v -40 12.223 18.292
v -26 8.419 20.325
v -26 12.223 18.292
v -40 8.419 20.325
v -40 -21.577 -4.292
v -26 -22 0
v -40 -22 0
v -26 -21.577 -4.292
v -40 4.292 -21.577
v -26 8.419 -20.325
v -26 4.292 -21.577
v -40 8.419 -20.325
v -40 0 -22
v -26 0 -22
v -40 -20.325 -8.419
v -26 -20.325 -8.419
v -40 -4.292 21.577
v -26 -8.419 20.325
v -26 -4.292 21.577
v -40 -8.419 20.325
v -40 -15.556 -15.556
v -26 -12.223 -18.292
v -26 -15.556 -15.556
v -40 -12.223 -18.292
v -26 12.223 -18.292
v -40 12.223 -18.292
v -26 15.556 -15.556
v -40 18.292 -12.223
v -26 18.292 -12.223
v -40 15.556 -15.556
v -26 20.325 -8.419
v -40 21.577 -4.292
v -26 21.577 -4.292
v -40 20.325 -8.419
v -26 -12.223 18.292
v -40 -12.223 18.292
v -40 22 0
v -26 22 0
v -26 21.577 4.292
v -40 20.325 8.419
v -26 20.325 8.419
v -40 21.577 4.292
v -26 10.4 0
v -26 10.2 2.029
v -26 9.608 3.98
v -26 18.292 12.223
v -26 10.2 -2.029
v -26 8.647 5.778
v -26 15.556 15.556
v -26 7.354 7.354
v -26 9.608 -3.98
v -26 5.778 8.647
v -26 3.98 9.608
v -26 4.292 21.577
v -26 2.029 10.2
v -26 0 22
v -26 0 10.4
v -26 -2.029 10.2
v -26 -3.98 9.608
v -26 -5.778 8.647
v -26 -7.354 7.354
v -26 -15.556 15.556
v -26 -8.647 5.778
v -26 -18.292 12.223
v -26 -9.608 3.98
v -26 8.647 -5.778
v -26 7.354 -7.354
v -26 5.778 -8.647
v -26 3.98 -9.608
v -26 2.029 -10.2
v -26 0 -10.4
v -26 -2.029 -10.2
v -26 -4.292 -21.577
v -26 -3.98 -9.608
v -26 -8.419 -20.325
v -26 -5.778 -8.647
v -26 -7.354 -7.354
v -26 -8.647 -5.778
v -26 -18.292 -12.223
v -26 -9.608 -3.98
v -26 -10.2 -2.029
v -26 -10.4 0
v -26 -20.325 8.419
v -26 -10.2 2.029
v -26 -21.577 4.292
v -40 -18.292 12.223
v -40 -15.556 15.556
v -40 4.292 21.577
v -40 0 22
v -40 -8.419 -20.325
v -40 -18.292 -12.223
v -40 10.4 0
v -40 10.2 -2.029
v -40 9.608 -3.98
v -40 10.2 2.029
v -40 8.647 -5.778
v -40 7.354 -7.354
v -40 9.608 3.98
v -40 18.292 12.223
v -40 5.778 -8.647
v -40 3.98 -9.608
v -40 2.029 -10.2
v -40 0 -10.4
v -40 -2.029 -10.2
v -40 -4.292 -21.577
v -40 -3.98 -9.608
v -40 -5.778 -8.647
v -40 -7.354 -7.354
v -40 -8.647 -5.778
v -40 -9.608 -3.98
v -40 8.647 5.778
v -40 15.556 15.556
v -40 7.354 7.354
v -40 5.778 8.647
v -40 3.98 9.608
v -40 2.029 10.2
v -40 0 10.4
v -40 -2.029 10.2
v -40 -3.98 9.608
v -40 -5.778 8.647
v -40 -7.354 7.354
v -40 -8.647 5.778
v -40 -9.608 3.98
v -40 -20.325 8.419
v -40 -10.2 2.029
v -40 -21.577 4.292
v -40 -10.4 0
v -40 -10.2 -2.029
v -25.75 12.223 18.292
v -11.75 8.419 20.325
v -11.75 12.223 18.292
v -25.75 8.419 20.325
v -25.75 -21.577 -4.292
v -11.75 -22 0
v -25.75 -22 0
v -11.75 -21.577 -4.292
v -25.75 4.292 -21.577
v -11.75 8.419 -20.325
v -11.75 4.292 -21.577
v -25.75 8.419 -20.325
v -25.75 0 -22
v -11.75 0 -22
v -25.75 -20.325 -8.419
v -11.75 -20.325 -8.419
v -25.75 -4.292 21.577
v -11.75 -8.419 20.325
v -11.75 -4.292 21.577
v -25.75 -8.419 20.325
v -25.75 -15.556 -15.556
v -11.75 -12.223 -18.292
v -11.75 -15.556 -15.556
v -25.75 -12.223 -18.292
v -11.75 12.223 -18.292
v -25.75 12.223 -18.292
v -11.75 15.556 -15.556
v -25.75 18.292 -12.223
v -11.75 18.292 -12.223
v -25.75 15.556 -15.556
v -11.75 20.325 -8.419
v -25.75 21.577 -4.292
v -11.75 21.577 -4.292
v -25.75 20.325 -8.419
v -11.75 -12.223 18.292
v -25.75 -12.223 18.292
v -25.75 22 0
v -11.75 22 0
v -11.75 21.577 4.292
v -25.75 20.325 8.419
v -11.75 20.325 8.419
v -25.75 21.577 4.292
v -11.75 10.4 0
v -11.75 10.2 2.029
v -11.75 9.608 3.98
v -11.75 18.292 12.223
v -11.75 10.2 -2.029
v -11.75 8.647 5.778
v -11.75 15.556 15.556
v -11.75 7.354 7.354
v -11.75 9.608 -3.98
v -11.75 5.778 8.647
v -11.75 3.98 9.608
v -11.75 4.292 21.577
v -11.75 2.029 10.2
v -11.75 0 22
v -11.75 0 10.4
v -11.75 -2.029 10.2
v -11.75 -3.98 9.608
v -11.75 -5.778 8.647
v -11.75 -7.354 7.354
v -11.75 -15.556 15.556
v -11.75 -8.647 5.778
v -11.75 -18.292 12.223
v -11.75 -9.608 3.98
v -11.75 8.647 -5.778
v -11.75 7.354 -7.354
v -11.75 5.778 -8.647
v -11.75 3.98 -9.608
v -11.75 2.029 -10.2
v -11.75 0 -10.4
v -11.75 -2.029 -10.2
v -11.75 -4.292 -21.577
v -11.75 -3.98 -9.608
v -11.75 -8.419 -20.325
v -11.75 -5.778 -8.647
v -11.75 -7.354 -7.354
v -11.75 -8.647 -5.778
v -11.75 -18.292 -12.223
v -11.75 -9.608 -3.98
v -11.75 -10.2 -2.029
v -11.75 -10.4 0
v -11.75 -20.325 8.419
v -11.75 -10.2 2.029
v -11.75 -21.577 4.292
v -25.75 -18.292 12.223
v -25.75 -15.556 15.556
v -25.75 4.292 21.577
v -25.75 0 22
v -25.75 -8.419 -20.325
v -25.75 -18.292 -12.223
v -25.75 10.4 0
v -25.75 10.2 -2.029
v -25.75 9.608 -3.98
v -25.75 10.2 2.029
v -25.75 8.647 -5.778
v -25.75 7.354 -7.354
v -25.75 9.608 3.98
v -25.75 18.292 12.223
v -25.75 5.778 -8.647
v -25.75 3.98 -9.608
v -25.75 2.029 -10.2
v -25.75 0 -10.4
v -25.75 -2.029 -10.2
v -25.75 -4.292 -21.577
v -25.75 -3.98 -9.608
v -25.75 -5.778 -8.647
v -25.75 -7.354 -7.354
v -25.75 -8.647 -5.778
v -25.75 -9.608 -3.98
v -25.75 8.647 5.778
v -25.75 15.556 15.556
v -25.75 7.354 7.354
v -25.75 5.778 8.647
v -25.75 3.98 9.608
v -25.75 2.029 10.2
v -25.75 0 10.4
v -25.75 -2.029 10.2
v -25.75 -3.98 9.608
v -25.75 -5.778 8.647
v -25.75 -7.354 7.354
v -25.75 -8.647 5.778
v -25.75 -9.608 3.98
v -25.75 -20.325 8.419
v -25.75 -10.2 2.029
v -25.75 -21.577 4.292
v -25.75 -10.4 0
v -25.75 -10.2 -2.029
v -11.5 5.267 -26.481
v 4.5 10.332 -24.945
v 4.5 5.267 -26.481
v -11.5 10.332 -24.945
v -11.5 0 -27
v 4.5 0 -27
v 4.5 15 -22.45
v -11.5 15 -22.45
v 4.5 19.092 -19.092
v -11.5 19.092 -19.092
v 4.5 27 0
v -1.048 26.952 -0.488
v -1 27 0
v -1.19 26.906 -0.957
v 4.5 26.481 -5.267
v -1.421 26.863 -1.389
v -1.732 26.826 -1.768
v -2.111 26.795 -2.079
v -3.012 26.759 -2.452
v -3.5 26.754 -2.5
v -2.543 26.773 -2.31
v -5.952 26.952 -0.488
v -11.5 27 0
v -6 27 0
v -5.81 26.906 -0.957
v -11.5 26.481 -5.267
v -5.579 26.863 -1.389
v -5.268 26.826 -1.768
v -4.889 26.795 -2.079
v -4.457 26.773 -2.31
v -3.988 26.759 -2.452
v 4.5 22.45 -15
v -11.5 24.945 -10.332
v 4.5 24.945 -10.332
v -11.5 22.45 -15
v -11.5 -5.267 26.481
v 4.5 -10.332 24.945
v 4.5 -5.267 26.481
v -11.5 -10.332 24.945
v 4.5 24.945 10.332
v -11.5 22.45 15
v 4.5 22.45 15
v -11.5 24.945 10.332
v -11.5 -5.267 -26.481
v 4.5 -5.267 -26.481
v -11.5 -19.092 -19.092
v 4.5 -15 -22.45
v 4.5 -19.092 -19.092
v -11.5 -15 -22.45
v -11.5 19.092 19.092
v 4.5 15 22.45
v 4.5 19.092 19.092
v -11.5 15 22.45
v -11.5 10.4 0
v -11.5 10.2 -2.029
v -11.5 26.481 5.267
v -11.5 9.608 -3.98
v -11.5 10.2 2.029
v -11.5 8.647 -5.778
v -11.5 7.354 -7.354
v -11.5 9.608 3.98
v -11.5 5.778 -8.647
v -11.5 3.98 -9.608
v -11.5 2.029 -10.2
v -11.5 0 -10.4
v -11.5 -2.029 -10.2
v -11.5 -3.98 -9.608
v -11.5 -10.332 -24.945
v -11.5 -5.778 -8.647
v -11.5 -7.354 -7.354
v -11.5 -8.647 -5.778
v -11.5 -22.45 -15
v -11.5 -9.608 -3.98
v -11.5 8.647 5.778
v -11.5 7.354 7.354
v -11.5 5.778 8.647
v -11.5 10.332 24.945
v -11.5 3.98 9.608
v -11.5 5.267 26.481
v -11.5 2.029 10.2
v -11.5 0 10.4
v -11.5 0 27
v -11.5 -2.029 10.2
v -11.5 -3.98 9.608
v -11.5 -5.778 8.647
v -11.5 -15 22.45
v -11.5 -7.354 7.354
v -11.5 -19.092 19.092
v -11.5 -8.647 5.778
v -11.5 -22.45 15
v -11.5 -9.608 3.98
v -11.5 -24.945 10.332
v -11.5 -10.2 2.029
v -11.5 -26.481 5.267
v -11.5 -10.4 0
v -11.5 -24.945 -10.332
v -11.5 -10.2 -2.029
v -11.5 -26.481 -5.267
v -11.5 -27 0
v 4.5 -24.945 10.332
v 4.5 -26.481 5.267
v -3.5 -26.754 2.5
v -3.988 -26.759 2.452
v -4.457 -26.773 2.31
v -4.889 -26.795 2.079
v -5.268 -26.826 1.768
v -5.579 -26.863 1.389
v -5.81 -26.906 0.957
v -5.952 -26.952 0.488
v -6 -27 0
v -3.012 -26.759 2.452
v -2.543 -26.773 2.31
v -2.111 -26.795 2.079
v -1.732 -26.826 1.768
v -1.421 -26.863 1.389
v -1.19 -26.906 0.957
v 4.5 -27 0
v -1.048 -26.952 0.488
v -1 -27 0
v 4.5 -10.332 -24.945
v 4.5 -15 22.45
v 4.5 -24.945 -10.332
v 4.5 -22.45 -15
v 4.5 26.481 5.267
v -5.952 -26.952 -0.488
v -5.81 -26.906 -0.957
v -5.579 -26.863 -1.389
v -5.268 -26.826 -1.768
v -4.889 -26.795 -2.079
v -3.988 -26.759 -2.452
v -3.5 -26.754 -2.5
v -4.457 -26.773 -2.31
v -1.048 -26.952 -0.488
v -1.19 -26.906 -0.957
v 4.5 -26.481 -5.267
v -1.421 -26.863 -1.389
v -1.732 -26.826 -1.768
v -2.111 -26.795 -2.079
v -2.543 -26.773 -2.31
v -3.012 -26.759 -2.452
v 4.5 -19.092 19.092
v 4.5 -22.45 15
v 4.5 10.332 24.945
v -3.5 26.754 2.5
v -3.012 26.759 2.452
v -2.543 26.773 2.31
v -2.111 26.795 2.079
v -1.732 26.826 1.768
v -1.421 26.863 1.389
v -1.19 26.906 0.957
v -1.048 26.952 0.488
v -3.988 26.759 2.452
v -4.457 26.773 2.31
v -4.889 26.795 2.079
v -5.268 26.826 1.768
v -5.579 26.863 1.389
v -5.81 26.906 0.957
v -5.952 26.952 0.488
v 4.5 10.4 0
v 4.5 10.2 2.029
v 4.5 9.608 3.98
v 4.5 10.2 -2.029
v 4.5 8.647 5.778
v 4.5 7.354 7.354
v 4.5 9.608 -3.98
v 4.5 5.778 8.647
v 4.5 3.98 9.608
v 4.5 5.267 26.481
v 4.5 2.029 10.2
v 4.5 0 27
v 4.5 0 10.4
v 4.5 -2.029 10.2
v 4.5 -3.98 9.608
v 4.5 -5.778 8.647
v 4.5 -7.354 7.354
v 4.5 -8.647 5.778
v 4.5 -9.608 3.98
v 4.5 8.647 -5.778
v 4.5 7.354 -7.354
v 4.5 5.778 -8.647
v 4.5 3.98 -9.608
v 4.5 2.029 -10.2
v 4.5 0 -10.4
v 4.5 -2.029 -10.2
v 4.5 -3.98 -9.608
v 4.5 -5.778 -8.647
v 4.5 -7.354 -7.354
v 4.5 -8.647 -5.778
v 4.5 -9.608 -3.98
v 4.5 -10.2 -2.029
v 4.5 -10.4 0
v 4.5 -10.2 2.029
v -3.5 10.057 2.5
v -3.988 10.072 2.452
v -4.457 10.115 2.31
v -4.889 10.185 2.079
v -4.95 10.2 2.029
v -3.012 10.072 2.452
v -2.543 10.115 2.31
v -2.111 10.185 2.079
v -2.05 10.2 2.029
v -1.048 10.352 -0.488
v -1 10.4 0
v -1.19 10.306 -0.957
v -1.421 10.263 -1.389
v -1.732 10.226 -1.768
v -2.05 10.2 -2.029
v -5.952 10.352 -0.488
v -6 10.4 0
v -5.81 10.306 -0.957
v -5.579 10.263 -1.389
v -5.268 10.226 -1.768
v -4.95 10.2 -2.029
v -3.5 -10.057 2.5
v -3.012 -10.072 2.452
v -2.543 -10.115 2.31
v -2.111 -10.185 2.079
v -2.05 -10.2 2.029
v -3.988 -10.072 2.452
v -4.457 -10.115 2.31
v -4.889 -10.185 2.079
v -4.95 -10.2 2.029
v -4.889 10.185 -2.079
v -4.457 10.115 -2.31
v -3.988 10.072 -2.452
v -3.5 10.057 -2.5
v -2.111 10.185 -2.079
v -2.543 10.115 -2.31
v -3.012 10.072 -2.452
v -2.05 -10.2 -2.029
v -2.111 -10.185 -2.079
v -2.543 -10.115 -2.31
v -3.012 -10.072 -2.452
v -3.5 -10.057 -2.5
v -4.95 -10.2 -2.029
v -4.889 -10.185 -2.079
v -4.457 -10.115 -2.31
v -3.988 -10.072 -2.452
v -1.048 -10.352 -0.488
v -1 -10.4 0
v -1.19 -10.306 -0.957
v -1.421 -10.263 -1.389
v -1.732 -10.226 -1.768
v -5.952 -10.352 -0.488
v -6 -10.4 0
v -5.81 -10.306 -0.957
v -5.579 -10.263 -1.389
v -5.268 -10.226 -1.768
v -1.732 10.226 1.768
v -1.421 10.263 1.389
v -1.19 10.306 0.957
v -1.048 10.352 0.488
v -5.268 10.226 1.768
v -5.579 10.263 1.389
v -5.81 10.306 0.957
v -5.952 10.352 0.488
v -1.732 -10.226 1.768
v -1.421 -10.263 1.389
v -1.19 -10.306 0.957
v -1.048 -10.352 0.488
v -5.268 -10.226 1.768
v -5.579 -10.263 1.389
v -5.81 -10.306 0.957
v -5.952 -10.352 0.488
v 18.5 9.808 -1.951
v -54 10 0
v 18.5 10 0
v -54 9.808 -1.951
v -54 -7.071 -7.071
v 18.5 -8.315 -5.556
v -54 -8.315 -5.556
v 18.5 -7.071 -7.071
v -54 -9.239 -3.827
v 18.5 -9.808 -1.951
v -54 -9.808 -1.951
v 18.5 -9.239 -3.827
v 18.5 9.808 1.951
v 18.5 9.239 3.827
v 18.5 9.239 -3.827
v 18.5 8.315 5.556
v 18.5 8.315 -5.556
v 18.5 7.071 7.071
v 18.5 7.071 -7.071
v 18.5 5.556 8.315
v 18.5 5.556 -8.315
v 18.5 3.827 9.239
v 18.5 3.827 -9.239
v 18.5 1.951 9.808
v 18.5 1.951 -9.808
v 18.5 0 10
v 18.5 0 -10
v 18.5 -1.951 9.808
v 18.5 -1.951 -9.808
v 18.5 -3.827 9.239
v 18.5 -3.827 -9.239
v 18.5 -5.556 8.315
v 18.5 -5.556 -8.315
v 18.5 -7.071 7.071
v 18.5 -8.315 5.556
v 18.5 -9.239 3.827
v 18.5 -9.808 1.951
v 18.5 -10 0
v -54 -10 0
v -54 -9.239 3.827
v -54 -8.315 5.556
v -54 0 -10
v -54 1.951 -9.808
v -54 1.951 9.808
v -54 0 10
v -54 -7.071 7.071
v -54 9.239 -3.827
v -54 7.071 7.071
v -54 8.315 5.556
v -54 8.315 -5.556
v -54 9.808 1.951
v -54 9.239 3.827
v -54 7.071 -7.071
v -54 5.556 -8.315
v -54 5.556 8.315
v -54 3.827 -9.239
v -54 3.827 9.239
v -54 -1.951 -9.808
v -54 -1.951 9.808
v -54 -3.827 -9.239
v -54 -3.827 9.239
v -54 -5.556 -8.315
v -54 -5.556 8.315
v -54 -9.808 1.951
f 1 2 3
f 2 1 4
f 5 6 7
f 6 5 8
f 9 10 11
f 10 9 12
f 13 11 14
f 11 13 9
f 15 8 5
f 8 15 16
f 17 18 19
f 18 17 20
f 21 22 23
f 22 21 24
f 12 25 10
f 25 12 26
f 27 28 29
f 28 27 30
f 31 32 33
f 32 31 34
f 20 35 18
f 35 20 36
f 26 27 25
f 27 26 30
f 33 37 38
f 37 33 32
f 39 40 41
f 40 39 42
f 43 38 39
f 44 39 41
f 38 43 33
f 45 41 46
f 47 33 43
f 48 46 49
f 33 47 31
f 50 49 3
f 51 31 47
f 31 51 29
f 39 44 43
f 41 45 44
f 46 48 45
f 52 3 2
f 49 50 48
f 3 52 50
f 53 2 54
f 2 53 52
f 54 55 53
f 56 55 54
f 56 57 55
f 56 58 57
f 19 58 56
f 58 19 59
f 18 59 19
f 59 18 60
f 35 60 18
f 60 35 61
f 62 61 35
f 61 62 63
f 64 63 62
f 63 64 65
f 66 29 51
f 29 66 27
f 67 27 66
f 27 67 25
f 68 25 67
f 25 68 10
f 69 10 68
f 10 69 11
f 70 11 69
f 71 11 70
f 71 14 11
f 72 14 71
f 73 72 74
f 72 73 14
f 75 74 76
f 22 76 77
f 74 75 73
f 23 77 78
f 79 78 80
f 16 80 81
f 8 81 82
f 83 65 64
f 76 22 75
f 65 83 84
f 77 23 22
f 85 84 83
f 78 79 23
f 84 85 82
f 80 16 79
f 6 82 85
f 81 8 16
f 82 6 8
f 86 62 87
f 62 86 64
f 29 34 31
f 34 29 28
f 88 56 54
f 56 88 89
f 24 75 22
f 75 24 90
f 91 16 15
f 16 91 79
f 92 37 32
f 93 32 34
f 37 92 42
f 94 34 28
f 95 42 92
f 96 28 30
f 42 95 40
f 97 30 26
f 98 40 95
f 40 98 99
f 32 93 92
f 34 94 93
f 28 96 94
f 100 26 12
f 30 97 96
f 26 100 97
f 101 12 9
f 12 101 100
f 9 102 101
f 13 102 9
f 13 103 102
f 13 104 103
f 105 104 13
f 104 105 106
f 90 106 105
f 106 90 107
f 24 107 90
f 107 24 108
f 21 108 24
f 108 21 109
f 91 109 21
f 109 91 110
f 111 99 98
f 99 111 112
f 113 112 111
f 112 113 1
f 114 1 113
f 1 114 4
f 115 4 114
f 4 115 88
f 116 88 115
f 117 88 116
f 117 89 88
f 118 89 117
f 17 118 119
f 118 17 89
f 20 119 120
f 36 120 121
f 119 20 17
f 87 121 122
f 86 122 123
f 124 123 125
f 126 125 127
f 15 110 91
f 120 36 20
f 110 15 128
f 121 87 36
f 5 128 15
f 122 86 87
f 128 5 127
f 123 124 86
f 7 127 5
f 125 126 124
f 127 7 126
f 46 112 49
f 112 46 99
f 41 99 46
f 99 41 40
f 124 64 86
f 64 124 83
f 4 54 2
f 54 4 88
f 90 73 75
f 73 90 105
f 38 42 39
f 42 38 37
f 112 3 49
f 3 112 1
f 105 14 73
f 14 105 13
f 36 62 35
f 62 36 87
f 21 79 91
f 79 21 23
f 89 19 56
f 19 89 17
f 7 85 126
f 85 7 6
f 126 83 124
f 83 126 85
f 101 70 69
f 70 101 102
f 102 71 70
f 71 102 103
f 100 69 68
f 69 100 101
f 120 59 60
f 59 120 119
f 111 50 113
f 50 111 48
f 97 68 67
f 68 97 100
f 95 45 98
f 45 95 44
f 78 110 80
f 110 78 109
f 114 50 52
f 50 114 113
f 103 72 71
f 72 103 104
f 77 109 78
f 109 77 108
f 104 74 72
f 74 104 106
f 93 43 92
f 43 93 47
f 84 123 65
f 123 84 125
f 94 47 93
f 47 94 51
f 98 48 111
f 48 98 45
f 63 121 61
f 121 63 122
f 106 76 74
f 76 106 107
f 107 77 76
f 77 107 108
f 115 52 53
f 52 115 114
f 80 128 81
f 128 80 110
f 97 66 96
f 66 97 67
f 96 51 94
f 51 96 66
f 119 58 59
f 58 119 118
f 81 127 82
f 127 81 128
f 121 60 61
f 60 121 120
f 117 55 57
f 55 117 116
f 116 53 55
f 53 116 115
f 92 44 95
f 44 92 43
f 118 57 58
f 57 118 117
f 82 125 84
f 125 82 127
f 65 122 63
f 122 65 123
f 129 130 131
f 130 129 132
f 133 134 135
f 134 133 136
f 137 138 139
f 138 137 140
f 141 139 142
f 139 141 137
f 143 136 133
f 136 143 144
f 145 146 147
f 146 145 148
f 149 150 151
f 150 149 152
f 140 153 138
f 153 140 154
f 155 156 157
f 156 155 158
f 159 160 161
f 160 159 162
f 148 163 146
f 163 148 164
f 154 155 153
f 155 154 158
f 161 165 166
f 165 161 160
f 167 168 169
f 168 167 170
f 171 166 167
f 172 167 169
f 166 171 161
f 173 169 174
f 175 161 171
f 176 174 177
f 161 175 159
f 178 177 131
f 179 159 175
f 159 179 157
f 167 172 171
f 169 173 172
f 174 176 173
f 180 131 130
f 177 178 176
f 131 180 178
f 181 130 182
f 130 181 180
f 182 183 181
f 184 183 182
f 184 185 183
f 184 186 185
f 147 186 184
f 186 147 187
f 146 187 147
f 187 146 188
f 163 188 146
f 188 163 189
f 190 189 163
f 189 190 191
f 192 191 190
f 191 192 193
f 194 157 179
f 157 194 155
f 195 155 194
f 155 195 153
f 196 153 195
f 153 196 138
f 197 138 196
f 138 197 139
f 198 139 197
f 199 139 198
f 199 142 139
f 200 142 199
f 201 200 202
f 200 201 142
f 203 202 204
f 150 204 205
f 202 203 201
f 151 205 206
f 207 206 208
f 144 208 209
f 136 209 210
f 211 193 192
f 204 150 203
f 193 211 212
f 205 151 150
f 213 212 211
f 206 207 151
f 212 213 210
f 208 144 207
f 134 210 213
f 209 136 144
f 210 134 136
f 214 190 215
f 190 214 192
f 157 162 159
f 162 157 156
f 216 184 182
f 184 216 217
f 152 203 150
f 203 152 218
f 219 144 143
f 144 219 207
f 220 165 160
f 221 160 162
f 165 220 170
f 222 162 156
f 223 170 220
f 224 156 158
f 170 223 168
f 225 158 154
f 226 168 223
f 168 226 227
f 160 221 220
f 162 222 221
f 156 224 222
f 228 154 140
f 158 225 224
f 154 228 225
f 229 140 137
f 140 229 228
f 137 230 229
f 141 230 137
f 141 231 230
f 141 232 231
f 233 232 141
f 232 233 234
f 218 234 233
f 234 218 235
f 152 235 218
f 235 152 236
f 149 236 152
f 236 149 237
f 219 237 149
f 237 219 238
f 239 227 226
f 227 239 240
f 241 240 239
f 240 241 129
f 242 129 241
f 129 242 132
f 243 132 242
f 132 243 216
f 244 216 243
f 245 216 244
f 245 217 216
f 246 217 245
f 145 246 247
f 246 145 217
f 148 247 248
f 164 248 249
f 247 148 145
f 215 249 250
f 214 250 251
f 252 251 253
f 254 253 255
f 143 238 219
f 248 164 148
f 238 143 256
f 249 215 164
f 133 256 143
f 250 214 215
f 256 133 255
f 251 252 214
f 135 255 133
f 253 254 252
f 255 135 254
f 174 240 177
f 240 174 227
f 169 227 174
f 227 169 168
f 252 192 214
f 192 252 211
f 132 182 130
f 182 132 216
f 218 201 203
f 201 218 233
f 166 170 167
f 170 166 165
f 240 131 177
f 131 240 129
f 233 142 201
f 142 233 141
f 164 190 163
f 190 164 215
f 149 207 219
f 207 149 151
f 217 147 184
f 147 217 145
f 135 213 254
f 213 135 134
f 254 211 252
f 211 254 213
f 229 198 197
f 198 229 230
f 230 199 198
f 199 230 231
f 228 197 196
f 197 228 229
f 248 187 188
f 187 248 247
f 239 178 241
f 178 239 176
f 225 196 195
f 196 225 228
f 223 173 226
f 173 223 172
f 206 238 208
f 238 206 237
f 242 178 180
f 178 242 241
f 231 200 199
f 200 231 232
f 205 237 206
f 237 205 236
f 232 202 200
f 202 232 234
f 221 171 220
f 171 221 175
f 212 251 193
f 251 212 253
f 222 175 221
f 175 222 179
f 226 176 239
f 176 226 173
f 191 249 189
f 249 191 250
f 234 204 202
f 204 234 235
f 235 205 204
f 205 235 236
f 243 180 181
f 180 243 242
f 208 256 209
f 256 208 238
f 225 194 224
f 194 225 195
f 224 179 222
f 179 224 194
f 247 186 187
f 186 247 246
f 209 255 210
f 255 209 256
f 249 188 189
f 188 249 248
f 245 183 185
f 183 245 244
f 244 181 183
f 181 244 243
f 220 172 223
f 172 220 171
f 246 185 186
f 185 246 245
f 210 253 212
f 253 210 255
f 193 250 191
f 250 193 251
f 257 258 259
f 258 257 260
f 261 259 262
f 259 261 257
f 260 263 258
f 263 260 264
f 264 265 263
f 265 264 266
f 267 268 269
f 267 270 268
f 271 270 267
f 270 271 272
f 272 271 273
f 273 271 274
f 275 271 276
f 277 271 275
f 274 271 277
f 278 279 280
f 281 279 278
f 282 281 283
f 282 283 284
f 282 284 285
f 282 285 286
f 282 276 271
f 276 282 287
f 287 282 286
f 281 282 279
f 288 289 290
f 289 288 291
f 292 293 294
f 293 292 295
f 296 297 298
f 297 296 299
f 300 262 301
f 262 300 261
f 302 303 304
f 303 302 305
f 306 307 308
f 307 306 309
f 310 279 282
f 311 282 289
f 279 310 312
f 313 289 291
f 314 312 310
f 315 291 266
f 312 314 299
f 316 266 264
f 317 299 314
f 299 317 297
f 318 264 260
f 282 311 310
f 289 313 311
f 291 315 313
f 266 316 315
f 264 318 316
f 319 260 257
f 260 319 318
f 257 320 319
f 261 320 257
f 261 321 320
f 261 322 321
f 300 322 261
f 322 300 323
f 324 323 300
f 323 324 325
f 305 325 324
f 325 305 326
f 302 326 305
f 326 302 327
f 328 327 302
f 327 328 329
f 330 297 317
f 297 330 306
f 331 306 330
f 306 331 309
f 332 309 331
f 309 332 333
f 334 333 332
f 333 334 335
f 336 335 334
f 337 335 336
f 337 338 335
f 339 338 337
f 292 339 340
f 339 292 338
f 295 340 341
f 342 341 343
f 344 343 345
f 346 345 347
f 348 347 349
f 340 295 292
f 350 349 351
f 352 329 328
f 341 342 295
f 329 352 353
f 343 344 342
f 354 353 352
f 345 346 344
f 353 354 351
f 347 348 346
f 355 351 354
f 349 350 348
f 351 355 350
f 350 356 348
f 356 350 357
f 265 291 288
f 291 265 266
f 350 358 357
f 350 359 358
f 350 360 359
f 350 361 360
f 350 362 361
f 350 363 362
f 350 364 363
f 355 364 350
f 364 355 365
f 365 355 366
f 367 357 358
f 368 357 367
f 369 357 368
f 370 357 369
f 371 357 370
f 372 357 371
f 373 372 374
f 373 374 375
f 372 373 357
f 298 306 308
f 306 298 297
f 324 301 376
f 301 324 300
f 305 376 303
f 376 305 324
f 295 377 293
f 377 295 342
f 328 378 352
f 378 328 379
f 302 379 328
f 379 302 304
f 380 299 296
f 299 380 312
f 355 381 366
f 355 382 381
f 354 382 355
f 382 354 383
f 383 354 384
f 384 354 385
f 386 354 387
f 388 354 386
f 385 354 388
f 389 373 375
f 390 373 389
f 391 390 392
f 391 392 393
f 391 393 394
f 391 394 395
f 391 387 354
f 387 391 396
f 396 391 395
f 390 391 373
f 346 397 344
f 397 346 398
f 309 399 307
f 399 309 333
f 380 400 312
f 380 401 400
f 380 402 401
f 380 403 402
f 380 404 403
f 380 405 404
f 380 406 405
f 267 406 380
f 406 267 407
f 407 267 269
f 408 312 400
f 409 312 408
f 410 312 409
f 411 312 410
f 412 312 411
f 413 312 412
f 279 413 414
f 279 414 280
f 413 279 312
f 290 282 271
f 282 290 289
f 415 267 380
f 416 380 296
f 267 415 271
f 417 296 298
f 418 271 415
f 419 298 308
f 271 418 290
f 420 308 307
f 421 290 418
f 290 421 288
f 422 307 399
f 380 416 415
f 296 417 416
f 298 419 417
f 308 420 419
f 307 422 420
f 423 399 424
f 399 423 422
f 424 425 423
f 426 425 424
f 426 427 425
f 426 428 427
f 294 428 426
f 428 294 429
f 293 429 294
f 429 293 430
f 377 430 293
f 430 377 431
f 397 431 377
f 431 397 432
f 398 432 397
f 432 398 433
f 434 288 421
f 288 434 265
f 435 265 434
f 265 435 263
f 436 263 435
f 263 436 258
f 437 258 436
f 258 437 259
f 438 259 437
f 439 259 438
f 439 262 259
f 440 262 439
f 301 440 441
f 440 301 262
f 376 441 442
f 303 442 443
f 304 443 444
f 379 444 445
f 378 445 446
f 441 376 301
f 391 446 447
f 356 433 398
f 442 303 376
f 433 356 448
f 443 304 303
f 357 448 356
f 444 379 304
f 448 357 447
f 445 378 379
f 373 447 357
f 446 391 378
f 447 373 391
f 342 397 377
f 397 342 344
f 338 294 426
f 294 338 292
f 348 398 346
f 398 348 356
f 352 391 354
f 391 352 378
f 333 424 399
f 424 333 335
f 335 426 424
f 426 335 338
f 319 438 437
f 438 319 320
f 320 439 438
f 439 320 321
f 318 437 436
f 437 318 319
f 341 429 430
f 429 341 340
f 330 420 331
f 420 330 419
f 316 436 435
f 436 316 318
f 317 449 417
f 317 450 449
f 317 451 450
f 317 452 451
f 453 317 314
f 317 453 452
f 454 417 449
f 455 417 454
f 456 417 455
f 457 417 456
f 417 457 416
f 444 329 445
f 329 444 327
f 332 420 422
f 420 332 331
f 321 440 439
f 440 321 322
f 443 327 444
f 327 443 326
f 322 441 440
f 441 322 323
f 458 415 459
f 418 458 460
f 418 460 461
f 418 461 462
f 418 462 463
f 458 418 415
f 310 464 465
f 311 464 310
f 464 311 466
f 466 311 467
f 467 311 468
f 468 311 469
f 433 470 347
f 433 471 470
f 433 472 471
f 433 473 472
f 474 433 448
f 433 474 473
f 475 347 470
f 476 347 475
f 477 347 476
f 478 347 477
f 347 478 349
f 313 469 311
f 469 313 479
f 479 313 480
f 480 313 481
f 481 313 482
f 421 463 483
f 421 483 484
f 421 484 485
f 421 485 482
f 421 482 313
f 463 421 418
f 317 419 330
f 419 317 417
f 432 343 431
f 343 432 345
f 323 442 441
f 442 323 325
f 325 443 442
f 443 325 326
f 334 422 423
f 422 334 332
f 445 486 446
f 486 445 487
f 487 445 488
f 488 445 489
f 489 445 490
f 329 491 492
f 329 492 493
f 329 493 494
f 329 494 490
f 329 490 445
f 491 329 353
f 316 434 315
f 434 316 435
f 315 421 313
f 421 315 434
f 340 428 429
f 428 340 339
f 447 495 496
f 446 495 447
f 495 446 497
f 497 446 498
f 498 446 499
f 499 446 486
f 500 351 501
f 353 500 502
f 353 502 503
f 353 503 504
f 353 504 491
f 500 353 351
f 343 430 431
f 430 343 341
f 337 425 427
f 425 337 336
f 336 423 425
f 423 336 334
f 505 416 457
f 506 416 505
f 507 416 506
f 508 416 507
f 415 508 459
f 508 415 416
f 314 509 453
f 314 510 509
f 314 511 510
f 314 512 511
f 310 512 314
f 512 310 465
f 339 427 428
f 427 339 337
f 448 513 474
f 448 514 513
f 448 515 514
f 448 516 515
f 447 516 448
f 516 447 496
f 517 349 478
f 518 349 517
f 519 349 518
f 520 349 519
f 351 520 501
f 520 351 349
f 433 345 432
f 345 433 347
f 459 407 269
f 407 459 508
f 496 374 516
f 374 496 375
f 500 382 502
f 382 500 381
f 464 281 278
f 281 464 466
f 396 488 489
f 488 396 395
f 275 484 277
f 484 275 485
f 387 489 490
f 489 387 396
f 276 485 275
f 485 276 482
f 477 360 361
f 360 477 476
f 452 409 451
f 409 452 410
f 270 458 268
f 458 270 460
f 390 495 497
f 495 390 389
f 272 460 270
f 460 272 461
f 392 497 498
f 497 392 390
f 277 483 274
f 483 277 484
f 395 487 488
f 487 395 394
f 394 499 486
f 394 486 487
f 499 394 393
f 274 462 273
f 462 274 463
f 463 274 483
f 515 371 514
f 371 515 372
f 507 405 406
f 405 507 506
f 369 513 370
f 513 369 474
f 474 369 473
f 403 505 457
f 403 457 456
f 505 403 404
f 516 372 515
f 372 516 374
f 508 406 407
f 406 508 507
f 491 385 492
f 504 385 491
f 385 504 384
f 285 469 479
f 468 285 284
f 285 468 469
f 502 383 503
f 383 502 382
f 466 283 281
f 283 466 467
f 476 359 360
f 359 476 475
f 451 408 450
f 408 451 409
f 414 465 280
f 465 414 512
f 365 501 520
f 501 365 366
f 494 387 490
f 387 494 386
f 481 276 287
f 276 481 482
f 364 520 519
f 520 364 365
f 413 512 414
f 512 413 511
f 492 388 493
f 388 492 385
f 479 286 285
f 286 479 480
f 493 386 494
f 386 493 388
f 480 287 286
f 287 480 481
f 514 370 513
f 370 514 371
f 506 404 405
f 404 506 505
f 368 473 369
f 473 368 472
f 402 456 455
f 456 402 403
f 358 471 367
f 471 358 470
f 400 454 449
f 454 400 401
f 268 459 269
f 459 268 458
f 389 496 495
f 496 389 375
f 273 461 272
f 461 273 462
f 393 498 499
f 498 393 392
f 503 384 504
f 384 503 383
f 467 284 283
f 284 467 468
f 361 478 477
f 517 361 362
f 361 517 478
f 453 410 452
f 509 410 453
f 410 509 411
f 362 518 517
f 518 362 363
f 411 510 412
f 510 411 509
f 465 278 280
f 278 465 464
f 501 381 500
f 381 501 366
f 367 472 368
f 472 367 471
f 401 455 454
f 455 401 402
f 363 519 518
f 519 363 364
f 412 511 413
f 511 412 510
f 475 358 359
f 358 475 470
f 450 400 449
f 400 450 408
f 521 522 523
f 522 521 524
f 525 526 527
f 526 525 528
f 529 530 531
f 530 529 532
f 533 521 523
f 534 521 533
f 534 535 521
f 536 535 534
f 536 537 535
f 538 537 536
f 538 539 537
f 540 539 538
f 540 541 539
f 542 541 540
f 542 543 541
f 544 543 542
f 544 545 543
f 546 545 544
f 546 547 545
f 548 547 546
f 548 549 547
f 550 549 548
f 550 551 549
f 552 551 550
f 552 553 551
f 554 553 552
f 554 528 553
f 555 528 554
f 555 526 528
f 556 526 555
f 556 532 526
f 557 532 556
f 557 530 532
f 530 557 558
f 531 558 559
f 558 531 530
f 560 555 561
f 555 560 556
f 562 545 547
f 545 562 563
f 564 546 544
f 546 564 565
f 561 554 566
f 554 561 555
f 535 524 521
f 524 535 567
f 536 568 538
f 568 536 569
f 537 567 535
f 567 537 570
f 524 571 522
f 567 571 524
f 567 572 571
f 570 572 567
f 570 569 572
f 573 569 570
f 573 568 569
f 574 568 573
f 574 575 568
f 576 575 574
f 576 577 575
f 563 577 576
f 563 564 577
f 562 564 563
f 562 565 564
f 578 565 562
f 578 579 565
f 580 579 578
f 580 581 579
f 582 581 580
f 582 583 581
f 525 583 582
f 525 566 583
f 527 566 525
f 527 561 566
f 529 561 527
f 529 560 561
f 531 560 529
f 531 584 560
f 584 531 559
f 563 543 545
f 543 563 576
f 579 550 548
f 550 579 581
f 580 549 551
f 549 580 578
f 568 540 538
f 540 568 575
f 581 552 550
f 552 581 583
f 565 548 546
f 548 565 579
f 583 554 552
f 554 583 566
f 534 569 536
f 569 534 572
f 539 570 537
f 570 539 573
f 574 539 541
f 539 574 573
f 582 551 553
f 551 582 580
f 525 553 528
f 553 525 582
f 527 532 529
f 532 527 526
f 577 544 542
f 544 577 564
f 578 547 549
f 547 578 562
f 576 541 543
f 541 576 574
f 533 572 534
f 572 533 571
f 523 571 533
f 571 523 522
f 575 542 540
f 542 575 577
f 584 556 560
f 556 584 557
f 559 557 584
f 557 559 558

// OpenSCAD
$fn = 32;

// ------------------------------------------------------------------------
// Shaft with rings and collars: d20 shaft, 3 rings
// Every part is its own module, assembly() places them once.
// ------------------------------------------------------------------------

// --- part 1 ---
module shaft() {
  translate([0, 0, -36.25]) cylinder(h = 72.5, d = 20);
}

// --- part 2 ---
module spacer_a() {
  difference() {
      translate([0, 0, 0]) cylinder(h = 14, d = 44);
      translate([0, 0, -1]) cylinder(h = 16, d = 20.8);
    }
}

// --- part 3 ---
module spacer_b() {
  difference() {
      translate([0, 0, 0]) cylinder(h = 14, d = 44);
      translate([0, 0, -1]) cylinder(h = 16, d = 20.8);
    }
}

// --- part 4 ---
module collar_a() {
  difference() {
    cylinder(h = 16, d = 54);
    translate([0, 0, -1]) cylinder(h = 18, d = 20.8);
    translate([0, 0, 8]) rotate([90, 0, 0]) cylinder(h = 56, d = 5, center = true);
  }
}

// --- assembly ---
module assembly() {
  translate([-17.75, 0, 0]) rotate([0, 90, 0]) shaft();
  translate([-40, 0, 0]) rotate([0, 90, 0]) spacer_a();
  translate([-25.75, 0, 0]) rotate([0, 90, 0]) spacer_b();
  translate([-11.5, 0, 0]) rotate([0, 90, 0]) collar_a();
}

assembly();
